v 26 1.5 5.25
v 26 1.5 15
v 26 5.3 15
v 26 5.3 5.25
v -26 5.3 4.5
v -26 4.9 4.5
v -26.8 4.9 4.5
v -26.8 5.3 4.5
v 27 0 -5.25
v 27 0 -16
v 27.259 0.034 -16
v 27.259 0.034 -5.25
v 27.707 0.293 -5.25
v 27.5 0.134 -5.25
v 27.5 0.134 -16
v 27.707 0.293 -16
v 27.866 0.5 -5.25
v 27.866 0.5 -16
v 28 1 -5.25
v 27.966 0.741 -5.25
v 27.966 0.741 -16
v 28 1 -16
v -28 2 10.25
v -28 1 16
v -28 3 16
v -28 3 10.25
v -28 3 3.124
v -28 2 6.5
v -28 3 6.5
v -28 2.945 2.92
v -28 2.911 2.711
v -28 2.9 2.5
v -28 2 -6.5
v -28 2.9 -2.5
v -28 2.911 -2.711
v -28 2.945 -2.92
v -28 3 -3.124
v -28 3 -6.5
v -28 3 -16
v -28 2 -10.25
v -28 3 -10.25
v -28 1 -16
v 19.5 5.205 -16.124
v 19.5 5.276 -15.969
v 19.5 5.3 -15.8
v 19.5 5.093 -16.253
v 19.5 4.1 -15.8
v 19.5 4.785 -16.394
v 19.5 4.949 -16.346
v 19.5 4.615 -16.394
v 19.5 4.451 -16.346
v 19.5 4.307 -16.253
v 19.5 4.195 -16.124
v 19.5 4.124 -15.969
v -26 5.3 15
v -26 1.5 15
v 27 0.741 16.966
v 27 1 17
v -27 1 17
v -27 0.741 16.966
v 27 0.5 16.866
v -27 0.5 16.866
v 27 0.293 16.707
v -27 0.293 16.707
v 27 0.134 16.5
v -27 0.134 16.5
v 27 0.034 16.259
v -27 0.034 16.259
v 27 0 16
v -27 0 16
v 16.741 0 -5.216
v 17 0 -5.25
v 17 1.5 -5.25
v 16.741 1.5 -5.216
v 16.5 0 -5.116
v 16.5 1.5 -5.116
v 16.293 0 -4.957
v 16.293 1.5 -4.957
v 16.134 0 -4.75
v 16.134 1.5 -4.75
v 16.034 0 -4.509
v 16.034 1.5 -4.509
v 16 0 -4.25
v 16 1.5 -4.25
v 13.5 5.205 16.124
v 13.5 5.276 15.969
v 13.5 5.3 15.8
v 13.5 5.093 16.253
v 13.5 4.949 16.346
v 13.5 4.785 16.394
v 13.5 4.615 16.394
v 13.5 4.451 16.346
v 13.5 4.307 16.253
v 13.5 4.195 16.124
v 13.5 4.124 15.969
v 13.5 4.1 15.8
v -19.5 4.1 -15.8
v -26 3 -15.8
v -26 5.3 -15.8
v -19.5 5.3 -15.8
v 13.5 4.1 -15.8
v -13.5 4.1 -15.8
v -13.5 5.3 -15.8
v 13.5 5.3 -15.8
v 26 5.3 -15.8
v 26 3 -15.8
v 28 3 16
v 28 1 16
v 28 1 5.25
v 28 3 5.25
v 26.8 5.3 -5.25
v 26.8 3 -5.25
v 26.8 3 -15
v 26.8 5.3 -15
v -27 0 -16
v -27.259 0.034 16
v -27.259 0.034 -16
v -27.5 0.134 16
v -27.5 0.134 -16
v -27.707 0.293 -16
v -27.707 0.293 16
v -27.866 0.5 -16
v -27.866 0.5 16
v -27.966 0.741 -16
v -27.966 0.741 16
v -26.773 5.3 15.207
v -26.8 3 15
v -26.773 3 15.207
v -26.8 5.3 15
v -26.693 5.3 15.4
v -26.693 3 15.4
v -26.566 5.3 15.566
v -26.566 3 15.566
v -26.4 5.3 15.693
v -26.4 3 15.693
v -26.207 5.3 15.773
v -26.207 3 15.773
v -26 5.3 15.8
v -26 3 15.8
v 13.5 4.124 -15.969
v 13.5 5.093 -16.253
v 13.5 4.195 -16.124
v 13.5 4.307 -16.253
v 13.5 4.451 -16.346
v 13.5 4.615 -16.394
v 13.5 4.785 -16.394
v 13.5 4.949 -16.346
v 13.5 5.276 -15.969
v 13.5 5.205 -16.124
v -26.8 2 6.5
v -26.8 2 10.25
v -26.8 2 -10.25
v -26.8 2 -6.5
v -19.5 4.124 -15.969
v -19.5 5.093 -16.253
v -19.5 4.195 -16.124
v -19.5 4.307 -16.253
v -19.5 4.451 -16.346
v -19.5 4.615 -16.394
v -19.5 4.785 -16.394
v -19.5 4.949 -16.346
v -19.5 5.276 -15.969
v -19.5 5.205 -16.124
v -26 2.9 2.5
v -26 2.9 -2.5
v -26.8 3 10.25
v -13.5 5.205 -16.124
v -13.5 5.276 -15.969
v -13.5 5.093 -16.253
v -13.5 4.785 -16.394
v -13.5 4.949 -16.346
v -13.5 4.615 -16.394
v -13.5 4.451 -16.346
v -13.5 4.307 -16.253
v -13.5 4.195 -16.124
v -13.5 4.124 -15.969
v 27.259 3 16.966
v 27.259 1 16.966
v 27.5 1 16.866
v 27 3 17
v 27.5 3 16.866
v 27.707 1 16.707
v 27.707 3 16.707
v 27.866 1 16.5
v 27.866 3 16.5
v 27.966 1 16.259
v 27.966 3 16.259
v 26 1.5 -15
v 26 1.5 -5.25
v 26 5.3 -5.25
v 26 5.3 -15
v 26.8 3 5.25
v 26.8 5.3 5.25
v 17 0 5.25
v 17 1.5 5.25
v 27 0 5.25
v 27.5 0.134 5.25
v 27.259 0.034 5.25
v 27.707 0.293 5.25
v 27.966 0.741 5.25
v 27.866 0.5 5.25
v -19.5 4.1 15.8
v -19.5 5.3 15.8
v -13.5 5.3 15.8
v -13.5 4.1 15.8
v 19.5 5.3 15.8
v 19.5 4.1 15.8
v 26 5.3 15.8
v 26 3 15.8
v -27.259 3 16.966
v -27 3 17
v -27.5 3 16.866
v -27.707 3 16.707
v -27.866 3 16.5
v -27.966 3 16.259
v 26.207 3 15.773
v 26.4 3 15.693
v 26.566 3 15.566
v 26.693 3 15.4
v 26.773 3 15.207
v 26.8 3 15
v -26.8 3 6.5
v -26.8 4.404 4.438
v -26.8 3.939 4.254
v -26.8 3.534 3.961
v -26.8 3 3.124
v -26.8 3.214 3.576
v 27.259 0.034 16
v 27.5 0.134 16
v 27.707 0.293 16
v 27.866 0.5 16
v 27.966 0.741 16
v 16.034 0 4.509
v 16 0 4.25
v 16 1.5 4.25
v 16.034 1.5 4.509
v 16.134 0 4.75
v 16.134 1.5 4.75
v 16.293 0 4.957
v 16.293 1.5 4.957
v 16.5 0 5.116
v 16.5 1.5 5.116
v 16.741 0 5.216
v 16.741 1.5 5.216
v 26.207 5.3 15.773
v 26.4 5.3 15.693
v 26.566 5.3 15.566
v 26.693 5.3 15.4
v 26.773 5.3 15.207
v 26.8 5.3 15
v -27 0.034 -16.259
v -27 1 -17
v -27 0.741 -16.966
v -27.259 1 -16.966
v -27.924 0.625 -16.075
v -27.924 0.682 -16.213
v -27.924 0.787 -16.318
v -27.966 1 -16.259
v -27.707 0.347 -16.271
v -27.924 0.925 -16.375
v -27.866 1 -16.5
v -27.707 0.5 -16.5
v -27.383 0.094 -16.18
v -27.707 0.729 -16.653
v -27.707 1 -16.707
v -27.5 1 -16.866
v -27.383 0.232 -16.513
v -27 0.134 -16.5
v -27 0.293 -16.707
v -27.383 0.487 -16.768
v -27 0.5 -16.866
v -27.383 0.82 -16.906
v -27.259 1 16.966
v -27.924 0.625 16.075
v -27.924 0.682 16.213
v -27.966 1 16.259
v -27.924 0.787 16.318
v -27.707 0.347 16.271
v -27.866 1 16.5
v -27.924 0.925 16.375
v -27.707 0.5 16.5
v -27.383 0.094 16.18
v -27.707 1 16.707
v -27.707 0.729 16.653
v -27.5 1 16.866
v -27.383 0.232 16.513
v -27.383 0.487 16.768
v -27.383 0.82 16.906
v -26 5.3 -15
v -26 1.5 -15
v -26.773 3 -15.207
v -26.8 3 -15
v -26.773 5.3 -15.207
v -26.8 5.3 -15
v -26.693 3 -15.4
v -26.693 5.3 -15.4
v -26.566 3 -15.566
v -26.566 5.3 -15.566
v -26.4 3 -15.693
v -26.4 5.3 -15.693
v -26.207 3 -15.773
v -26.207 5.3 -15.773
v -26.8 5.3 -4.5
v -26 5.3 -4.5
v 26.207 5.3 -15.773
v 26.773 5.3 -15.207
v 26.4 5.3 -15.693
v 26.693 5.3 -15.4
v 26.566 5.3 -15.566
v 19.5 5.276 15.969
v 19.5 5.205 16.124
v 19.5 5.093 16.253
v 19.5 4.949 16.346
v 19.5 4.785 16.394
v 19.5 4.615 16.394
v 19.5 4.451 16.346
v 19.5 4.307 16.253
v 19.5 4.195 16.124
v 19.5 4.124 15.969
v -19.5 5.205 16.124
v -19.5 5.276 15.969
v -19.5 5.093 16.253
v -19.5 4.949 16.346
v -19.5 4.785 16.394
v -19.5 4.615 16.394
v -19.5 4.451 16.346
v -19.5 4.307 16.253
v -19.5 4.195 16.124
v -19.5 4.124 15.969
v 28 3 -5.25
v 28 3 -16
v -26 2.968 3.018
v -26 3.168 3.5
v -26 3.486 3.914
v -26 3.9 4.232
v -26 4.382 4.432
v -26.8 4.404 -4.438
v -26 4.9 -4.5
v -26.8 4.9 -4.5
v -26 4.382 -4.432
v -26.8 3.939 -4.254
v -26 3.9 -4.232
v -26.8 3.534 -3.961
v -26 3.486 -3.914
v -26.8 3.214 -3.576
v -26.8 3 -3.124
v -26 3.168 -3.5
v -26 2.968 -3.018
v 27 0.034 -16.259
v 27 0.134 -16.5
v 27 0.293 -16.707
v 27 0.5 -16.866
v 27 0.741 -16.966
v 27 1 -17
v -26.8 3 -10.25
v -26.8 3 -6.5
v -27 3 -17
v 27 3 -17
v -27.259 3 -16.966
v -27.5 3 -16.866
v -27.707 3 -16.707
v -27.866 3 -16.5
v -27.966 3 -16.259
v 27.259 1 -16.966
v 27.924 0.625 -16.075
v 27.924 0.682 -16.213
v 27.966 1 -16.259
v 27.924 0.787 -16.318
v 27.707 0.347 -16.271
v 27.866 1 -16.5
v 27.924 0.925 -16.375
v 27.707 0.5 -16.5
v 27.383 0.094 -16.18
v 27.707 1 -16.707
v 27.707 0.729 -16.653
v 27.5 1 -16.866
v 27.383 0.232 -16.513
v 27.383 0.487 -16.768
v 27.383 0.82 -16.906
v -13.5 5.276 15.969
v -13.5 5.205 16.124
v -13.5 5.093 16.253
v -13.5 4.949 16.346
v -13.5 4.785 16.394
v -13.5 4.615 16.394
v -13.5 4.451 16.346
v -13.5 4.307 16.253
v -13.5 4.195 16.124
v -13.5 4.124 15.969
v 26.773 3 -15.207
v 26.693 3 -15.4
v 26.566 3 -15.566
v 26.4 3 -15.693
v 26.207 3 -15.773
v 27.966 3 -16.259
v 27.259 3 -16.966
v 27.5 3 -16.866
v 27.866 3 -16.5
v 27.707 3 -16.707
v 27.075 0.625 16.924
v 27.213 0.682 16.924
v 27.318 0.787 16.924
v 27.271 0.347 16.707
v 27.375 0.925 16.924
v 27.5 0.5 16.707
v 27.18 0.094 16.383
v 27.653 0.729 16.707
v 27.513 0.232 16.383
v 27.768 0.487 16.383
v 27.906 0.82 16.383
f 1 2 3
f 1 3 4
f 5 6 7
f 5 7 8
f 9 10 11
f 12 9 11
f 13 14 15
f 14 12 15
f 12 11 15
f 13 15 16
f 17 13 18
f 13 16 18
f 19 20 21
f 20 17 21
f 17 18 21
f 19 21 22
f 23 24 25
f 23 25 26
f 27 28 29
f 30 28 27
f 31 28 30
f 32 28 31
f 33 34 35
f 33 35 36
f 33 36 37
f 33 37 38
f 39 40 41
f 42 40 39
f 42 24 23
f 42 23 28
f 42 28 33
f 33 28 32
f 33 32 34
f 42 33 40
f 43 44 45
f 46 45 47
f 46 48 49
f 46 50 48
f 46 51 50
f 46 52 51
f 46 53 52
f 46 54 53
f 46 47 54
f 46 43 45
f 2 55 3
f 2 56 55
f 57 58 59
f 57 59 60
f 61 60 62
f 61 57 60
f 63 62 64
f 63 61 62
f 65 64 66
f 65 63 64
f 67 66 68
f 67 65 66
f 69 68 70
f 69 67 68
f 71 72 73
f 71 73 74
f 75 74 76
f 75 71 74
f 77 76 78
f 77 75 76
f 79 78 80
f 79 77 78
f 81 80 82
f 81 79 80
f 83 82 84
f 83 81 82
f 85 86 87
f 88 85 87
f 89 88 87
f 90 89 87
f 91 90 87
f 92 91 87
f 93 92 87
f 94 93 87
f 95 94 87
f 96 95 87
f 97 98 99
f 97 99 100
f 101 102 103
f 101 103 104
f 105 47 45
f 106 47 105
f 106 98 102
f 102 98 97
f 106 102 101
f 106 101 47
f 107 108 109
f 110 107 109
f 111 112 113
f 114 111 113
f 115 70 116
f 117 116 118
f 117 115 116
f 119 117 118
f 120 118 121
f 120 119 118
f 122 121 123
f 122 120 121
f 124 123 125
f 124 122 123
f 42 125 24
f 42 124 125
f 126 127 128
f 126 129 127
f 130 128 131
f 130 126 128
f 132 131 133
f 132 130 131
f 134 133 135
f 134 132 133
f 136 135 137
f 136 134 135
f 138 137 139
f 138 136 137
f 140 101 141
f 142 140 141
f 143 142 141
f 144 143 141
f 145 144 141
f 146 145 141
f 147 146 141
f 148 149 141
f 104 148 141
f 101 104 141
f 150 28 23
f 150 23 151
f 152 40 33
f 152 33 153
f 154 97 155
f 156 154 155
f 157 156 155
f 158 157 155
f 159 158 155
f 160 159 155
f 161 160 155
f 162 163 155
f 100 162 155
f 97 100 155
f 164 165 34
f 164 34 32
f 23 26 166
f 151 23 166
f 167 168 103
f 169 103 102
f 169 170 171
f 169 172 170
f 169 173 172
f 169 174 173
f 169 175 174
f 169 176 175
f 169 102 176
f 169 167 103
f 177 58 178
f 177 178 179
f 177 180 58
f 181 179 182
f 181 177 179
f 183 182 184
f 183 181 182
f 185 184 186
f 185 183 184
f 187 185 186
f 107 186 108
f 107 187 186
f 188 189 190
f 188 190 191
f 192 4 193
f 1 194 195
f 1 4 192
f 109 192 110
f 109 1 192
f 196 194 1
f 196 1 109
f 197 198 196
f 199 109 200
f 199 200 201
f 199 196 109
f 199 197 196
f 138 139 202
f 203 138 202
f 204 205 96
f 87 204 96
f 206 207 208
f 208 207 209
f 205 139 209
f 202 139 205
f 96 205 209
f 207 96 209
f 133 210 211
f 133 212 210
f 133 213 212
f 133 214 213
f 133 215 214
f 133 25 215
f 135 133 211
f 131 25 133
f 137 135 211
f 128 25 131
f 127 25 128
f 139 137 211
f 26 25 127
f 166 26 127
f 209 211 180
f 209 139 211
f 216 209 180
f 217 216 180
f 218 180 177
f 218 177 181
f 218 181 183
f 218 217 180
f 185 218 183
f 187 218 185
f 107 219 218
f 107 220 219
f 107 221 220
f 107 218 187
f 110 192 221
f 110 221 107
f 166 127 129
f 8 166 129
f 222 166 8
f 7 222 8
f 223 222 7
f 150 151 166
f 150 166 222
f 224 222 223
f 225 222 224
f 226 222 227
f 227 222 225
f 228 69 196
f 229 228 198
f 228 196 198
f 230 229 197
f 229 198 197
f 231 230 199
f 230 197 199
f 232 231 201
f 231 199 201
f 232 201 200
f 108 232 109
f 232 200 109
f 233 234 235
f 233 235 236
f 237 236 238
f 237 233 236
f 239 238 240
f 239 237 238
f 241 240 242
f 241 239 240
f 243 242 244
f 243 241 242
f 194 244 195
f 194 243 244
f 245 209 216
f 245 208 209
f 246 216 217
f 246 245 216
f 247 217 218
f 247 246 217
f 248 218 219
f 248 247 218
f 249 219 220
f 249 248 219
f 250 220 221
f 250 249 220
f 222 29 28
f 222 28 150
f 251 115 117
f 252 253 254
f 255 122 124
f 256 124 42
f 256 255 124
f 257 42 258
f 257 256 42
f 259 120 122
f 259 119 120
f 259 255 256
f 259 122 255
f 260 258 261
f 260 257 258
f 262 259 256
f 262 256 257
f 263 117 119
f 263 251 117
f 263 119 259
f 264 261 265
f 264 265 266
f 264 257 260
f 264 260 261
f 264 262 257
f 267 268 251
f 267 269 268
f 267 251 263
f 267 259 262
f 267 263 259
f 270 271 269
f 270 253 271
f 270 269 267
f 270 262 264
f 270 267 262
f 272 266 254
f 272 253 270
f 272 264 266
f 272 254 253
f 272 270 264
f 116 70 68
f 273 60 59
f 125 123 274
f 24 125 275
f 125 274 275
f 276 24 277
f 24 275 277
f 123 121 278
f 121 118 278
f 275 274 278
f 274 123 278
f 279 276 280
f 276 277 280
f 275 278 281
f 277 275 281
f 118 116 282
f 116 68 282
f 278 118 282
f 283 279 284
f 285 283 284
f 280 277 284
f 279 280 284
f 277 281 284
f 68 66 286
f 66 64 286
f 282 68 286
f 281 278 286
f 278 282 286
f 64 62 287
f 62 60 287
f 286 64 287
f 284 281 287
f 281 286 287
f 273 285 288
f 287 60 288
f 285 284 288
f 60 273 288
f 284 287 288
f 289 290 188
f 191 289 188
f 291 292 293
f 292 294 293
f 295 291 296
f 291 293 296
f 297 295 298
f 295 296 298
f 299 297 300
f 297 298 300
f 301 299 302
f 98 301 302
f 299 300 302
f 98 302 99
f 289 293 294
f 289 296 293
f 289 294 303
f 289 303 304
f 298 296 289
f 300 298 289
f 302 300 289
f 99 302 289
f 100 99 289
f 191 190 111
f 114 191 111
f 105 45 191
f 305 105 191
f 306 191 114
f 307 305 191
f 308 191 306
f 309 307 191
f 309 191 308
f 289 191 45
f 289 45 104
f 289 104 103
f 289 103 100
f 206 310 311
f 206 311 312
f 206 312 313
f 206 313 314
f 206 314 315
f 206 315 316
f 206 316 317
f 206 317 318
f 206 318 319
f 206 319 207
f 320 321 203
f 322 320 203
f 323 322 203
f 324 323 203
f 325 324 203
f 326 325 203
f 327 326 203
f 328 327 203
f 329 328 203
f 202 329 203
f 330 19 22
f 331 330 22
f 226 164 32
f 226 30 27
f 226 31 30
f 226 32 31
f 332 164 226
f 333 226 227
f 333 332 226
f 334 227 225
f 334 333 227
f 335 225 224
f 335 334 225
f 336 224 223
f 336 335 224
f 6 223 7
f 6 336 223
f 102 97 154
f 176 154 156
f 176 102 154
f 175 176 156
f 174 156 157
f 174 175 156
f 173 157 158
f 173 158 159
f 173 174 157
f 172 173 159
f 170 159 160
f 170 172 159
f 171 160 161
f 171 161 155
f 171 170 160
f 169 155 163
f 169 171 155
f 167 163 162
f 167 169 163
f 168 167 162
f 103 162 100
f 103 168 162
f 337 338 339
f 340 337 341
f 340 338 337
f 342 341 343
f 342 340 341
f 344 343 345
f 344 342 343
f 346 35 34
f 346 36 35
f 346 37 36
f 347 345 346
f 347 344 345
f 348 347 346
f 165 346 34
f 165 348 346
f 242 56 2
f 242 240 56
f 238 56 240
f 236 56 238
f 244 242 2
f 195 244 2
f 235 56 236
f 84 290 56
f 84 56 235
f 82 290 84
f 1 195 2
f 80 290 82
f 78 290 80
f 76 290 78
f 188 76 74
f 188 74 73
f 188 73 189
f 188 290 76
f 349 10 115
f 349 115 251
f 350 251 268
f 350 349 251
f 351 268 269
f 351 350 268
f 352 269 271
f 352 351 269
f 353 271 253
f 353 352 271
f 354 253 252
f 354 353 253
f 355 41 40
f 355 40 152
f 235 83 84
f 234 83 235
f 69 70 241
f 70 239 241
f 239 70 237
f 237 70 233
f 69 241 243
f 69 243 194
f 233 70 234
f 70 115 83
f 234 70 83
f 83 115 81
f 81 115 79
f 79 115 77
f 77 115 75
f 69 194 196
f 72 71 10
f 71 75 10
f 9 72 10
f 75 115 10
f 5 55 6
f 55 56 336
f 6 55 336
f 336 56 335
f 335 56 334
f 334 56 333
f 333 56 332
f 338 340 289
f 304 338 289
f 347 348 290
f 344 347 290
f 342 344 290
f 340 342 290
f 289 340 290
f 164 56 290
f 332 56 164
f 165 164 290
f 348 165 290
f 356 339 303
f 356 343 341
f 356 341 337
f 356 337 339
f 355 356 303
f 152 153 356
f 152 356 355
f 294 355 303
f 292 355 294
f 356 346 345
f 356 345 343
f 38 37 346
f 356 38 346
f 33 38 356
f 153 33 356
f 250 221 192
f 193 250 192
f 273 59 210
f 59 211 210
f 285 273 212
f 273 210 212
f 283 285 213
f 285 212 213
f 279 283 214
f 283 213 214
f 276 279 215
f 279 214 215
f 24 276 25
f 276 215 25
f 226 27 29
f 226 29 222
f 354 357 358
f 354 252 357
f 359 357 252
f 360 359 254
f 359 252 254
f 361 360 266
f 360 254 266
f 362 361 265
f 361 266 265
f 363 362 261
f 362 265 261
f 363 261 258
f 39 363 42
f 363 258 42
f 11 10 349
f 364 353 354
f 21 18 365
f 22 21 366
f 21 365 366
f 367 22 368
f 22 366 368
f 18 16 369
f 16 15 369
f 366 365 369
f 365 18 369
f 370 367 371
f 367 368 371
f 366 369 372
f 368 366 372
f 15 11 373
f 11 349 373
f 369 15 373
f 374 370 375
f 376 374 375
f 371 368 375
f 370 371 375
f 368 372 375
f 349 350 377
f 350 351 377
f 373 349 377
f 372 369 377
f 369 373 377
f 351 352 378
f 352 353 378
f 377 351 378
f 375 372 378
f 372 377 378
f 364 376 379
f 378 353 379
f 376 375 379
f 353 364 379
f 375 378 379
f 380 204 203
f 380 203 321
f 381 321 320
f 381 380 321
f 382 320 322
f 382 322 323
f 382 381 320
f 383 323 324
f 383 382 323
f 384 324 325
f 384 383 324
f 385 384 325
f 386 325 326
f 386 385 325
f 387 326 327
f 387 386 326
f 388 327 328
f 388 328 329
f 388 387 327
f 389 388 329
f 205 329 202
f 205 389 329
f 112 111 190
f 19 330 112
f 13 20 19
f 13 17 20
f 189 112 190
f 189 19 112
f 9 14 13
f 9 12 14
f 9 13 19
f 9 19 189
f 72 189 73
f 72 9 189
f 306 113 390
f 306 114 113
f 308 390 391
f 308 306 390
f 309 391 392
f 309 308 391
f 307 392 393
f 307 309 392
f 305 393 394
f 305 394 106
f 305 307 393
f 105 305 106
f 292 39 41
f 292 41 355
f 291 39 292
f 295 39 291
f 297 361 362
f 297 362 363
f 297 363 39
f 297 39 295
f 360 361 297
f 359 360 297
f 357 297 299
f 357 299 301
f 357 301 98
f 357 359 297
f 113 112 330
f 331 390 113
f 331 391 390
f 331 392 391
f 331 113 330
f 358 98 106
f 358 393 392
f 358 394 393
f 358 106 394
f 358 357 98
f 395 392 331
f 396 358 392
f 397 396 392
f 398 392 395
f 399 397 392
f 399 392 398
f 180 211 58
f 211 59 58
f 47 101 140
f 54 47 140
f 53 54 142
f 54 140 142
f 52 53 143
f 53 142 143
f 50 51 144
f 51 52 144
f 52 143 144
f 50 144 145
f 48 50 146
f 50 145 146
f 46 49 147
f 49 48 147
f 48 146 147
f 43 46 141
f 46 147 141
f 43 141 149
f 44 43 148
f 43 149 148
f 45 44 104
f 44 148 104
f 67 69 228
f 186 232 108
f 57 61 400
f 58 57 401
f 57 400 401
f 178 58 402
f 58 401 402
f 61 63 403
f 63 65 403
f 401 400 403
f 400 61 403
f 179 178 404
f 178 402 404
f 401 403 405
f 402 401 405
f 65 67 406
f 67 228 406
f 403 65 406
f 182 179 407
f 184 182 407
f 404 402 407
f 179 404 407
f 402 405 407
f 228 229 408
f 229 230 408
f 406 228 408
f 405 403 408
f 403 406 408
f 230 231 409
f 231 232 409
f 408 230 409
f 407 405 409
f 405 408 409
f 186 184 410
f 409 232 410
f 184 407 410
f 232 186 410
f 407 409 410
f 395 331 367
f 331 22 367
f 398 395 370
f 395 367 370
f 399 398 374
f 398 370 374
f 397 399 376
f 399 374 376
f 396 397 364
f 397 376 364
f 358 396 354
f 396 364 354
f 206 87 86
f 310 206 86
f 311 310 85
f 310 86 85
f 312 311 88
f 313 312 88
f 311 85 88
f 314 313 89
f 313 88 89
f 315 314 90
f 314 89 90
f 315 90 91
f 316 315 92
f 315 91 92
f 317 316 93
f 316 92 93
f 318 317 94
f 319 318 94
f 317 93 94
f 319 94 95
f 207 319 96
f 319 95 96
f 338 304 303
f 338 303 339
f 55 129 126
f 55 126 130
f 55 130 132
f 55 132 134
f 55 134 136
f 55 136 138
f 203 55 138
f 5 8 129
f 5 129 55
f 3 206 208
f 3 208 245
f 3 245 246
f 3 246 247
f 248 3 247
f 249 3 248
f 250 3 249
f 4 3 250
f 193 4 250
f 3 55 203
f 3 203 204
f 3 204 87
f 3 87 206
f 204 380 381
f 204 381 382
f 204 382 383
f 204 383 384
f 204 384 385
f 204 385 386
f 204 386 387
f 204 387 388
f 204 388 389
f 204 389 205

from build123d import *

# Parameters (mm, degrees)
SKETCH1_W           = 56
SKETCH1_H           = 34
BOSS_EXTRUDE1_DEPTH = 1.5
SKETCH1_3_W         = 56
SKETCH1_3_H         = 34
SKETCH1_3_W_2       = 52
SKETCH1_3_H_2       = 30
BOSS_EXTRUDE2_DEPTH = 3
SKETCH2_W           = 53.6
SKETCH2_H           = 31.6
SKETCH2_W_2         = 52
SKETCH2_H_2         = 30
BOSS_EXTRUDE3_DEPTH = 2.3
SKETCH3_W           = 1.2
SKETCH3_H           = 3.75
CUT_EXTRUDE1_DEPTH  = 1
BOSS_EXTRUDE4_START = 13.5
SKETCH4_R           = 0.6
BOSS_EXTRUDE4_DEPTH = 6
FILLET1_R           = 1
FILLET2_R           = 0.8
CUT_EXTRUDE2_DEPTH  = 34.182676203
CUT_EXTRUDE4_DEPTH  = 34.182676203


with BuildPart() as part:
    # Sketch1 → Boss-Extrude1 (new body)
    with BuildSketch(Plane(origin=(0, 0, 0), x_dir=(1, 0, 0), z_dir=(0, 1, 0))):
        Rectangle(SKETCH1_W, SKETCH1_H)
    extrude(amount=BOSS_EXTRUDE1_DEPTH)

    # Sketch1<3> → Boss-Extrude2 (add)
    with BuildSketch(Plane(origin=(0, 0, 0), x_dir=(1, 0, 0), z_dir=(0, 1, 0))):
        Rectangle(SKETCH1_3_W, SKETCH1_3_H)
        Rectangle(SKETCH1_3_W_2, SKETCH1_3_H_2, mode=Mode.SUBTRACT)
    extrude(amount=BOSS_EXTRUDE2_DEPTH)

    # Sketch2 → Boss-Extrude3 (add)
    with BuildSketch(Plane(origin=(0, 3, 0), x_dir=(1, 0, 0), z_dir=(0, 1, 0))):
        Rectangle(SKETCH2_W, SKETCH2_H)
        Rectangle(SKETCH2_W_2, SKETCH2_H_2, mode=Mode.SUBTRACT)
    extrude(amount=BOSS_EXTRUDE3_DEPTH)

    # Sketch3 → Cut-Extrude1 (cut)
    with BuildSketch(Plane(origin=(0, 3, 0), x_dir=(1, 0, 0), z_dir=(0, 1, 0))):
        with Locations((-27.4, -8.375)):
            Rectangle(SKETCH3_W, SKETCH3_H)
        with Locations((-27.4, 8.375)):
            Rectangle(SKETCH3_W, SKETCH3_H)
    extrude(amount=-CUT_EXTRUDE1_DEPTH, mode=Mode.SUBTRACT)

    # Sketch4 → Boss-Extrude4 (add)
    with BuildSketch(Plane(origin=(0, 0, 0), x_dir=(0, 0, -1), z_dir=(1, 0, 0)).offset(BOSS_EXTRUDE4_START)):
        with Locations((15.8, 4.7)):
            Circle(SKETCH4_R)
        with Locations((-15.8, 4.7)):
            Circle(SKETCH4_R)
    boss_extrude4 = extrude(amount=BOSS_EXTRUDE4_DEPTH)

    # Mirror1: Boss-Extrude4 across plane
    add(boss_extrude4.mirror(Plane(origin=(0, 0, 0), x_dir=(0, 0, 1), z_dir=(1, 0, 0))))

    # Fillet1
    fillet1_edges = [part.edges().sort_by_distance(p)[0] for p in [
        (0, 0, 17),
        (28, 0, 0),
        (0, 0, -17),
        (-28, 0, 0),
        (28, 1.5, 17),
        (-28, 1.5, 17),
        (-28, 1.5, -17),
        (28, 1.5, -17),
    ]]
    fillet(fillet1_edges, radius=FILLET1_R)

    # Fillet2
    fillet2_edges = [part.edges().sort_by_distance(p)[0] for p in [
        (26.8, 4.15, 15.8),
        (-26.8, 4.15, 15.8),
        (-26.8, 4.15, -15.8),
        (26.8, 4.15, -15.8),
    ]]
    fillet(fillet2_edges, radius=FILLET2_R)

    # Sketch5 → Cut-Extrude2 (cut, through all)
    with BuildSketch(Plane(origin=(0, 0, 0), x_dir=(0, 0, -1), z_dir=(1, 0, 0))):
        with BuildLine():
            Line((-4.5, 9.622902271), (4.5, 9.622902271))
            Line((4.5, 9.622902271), (4.5, 4.9))
            ThreePointArc((4.5, 4.9), (3.914213562, 3.485786438), (2.5, 2.9))
            Line((2.5, 2.9), (-2.5, 2.9))
            ThreePointArc((-2.5, 2.9), (-3.914213562, 3.485786438), (-4.5, 4.9))
            Line((-4.5, 4.9), (-4.5, 9.622902271))
        make_face()
    extrude(amount=-CUT_EXTRUDE2_DEPTH, mode=Mode.SUBTRACT)

    # Sketch7 → Cut-Extrude4 (cut, through all)
    with BuildSketch(Plane.XZ):
        with BuildLine():
            Line((32.037949749, -5.25), (17, -5.25))
            ThreePointArc((17, -5.25), (16.292893219, -4.957106781), (16, -4.25))
            Line((16, -4.25), (16, 4.25))
            ThreePointArc((16, 4.25), (16.292893219, 4.957106781), (17, 5.25))
            Line((17, 5.25), (32.037949749, 5.25))
            Line((32.037949749, 5.25), (32.037949749, -5.25))
        make_face()
    extrude(amount=-CUT_EXTRUDE4_DEPTH, mode=Mode.SUBTRACT)


solid = part.part
